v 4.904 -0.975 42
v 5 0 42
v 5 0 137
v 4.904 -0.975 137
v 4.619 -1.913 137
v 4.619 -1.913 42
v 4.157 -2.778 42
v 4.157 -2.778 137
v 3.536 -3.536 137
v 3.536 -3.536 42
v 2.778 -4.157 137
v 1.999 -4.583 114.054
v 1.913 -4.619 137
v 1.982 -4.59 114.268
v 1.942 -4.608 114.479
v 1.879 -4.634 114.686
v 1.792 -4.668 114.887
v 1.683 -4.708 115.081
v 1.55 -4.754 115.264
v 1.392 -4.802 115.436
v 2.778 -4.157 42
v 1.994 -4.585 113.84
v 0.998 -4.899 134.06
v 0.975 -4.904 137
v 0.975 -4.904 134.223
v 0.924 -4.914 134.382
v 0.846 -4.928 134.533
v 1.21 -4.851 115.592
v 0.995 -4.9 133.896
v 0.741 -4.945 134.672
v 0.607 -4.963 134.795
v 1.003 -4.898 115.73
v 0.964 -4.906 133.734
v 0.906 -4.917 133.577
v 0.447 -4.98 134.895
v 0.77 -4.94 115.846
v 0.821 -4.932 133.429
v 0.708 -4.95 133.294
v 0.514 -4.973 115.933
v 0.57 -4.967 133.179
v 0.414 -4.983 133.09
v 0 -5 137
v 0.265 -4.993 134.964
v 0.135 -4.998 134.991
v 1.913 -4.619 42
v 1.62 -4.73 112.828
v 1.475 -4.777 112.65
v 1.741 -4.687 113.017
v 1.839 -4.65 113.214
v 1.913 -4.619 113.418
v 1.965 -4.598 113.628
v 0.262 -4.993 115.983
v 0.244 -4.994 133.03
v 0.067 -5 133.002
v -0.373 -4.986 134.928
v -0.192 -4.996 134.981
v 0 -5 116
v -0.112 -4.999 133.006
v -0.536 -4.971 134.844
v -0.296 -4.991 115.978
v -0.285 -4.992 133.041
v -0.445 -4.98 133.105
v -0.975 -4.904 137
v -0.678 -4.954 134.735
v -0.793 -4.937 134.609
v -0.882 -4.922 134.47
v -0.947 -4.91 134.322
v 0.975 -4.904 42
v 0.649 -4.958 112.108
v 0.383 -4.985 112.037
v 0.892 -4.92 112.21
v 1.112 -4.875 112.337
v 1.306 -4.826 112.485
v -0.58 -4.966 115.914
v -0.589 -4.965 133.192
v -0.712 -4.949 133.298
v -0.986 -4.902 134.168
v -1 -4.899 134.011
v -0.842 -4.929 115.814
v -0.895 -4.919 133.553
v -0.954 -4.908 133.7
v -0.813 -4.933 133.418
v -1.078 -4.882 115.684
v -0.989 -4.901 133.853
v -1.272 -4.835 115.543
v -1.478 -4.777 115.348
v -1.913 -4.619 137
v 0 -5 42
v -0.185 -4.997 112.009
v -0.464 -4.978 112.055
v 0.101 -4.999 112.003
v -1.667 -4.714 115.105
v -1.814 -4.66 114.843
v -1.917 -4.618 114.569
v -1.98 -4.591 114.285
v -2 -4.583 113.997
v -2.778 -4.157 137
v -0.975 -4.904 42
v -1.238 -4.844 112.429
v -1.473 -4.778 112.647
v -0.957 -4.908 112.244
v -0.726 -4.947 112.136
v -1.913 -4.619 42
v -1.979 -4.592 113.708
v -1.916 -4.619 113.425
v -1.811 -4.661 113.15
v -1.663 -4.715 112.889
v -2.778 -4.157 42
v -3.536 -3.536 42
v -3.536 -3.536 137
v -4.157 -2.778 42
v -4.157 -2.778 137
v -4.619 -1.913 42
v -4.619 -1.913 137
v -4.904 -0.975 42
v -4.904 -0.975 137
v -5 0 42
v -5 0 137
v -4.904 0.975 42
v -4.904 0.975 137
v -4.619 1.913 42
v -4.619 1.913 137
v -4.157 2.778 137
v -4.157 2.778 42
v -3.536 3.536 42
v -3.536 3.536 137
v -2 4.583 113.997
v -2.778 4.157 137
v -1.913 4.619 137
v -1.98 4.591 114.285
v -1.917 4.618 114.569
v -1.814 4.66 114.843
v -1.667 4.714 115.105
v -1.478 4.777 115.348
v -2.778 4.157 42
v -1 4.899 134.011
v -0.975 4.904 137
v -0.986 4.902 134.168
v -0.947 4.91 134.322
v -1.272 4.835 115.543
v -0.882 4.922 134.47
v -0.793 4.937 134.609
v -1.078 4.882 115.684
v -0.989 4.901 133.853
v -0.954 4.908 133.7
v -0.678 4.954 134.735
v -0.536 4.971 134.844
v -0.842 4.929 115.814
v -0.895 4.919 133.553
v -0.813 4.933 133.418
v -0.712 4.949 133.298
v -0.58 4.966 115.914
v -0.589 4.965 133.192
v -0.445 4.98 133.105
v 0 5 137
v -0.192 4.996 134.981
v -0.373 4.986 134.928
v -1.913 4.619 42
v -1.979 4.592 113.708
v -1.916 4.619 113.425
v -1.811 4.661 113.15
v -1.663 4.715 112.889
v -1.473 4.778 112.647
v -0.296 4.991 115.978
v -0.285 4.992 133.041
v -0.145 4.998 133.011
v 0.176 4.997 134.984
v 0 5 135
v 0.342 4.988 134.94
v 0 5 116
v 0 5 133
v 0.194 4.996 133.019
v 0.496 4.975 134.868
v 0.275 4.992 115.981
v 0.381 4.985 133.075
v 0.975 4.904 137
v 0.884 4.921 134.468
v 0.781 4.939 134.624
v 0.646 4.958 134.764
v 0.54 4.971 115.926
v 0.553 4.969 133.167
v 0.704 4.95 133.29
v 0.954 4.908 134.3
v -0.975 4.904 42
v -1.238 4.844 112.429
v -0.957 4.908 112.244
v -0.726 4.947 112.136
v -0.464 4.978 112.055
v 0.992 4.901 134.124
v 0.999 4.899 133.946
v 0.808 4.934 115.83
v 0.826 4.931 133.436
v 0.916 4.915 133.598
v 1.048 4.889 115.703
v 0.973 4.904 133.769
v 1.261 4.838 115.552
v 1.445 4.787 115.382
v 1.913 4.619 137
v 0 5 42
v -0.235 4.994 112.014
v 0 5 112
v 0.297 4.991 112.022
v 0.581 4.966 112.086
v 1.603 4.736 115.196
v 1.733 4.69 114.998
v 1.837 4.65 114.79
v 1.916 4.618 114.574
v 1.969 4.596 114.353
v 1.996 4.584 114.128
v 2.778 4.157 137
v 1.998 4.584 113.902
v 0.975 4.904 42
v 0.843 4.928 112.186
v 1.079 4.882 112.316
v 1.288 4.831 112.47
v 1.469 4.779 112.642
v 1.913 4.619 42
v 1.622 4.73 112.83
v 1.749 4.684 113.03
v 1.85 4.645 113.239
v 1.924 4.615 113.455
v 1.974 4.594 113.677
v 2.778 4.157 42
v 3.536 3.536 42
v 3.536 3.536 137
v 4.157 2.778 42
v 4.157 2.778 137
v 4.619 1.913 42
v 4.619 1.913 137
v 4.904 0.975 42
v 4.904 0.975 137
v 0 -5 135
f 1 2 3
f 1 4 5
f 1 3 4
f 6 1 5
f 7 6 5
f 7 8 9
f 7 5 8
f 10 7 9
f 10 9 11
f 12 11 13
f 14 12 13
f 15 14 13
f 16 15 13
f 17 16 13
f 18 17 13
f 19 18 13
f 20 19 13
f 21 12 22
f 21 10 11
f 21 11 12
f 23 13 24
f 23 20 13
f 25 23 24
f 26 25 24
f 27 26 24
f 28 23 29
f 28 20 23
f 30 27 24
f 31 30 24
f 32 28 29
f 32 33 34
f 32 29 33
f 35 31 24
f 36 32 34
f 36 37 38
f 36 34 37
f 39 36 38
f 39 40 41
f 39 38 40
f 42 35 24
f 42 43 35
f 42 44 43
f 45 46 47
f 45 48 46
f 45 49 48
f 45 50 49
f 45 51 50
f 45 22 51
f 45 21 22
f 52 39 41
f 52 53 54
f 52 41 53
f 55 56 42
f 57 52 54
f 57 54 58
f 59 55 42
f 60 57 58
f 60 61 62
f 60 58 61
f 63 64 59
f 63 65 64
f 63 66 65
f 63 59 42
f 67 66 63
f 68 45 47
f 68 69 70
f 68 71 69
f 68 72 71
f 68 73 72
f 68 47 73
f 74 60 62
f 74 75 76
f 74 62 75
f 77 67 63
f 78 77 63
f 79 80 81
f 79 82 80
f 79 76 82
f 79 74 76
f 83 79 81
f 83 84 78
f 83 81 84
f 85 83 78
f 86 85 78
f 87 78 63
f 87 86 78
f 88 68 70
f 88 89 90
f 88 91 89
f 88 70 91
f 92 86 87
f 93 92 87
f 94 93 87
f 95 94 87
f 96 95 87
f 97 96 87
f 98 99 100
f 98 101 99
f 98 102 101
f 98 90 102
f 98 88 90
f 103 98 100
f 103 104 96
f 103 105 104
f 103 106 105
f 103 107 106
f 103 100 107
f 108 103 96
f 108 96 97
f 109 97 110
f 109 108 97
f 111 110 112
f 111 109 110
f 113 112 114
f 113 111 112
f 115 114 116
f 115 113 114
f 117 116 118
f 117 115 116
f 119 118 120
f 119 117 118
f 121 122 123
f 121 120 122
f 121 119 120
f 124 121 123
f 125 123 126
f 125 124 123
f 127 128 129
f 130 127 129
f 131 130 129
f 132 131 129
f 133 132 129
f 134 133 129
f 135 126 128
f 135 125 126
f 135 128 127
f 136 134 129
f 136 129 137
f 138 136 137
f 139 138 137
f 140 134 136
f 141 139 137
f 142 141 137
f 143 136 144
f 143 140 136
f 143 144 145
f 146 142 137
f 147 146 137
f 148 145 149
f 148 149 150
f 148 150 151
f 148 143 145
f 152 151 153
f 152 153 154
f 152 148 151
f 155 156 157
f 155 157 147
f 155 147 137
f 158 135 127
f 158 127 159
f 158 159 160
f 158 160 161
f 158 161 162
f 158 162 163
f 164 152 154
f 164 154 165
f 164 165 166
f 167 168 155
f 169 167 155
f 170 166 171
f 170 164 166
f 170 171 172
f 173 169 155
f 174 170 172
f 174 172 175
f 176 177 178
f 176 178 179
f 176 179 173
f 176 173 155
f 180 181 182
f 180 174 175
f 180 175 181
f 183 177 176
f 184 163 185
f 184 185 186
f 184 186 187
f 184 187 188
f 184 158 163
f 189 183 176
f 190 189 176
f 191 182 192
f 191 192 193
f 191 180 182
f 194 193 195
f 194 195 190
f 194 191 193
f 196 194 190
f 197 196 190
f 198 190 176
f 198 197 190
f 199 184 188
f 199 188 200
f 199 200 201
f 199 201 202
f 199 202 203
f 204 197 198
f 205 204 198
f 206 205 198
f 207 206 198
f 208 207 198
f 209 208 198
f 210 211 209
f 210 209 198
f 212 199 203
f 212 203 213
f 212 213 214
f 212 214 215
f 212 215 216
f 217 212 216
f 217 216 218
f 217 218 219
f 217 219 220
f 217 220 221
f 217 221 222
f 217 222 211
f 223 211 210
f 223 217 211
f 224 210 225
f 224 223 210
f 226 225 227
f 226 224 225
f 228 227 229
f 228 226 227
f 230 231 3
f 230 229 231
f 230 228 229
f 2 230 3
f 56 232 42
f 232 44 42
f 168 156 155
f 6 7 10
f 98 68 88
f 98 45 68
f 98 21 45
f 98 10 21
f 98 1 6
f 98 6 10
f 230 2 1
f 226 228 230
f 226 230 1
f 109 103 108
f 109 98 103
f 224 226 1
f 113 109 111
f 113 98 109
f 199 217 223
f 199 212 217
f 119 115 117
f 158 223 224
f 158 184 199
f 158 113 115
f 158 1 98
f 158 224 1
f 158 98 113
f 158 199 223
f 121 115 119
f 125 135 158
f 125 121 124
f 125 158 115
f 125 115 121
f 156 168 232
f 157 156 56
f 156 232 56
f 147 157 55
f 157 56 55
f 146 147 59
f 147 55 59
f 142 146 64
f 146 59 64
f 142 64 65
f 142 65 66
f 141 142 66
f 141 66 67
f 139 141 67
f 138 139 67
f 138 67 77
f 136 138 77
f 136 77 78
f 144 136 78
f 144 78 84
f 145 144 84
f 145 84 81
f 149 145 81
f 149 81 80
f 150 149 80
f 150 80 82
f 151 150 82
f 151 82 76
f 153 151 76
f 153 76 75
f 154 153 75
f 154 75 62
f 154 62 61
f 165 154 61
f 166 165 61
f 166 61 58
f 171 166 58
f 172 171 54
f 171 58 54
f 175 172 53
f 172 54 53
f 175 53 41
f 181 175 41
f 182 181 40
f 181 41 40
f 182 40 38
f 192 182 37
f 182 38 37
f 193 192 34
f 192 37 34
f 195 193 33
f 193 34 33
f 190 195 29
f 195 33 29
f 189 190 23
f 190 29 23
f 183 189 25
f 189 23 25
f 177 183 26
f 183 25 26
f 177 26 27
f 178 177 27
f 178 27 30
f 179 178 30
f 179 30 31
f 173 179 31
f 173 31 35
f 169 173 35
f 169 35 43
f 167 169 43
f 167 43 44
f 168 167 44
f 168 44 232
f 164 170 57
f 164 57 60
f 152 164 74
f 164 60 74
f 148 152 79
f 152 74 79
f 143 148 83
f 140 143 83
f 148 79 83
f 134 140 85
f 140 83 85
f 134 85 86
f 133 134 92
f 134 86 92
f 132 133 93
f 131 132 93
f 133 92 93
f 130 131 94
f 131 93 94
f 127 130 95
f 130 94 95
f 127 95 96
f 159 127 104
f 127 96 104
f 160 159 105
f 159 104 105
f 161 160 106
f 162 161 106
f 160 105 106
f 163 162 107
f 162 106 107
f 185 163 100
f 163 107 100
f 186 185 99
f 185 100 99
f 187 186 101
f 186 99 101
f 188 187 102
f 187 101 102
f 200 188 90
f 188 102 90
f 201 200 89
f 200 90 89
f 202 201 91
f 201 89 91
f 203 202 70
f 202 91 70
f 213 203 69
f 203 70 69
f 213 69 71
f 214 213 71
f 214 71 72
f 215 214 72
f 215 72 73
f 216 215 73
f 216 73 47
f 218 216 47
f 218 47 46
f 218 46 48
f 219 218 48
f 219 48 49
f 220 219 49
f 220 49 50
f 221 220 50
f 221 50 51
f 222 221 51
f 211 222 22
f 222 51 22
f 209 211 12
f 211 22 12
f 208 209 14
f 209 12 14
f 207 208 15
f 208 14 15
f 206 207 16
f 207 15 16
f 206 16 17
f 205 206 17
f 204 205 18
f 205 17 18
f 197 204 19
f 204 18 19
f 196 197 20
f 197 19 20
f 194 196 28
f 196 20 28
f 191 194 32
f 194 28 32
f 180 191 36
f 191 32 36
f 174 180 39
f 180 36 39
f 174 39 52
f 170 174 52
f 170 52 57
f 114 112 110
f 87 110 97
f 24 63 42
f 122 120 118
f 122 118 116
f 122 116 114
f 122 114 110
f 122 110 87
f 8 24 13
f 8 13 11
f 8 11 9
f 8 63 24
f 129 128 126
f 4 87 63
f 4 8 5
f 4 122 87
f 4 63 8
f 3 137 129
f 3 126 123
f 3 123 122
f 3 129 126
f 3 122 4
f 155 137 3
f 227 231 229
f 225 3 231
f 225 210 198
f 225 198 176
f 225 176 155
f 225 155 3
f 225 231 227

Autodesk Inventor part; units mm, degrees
ref_plane "YZ Plane" through (0, 0, 0) normal (1, 0, 0) x (0, 1, 0)
ref_plane "XY Plane" through (0, 0, 0) normal (0, 0, 1) x (1, 0, 0)
sketch "スケッチ1" plane through (0, 0, 0) normal (0, 0, 1) x (1, 0, 0)
  circle A0 centre (0, 0) radius 5
  dimension "d0" = 10
extrude "押し出し1" add sketch "スケッチ1" along normal blind 137
ref_plane "作業平面1" through (0, 5, 0) normal (0, 1, 0) x (-1, 0, 0)
sketch "スケッチ2" plane through (0, 5, 0) normal (0, 1, 0) x (-1, 0, 0)
  line L0 (5, 0) -> (-5, 0) projected
  line L1 (5, 137) -> (-5, 137) projected
  point P0 (0, 0)
  point P1 (0, 3)
  point P2 (0, 134)
  point P3 (0, 114)
  point P4 (0, 38)
  point P5 (0, 69.5)
  point P6 (0, 50)
  dimension "d3" = 3
  dimension "d19" = 3
  dimension "d20" = 23
  dimension "d22" = 99
  dimension "d23" = 44.5
  dimension "d24" = 19.5
hole "穴1" at (0, 5, 3) at (0, 5, 134) at (0, 5, 38) direction (0, -1, 0) diameter 2 end through all
hole "穴2" at (0, 5, 114) direction (0, -1, 0) diameter 4 end through all
sketch "スケッチ4" plane through (0, 0, 0) normal (0, 0, -1) x (-1, 0, 0)
  circle A0 centre (0, 0) radius 5 projected
  circle A1 centre (0, 0) radius 5
extrude "押し出し2" cut sketch "スケッチ4" against normal blind 42
properties part number "light_bar_roller_10" material "アルミニウム 6061-AHC"
